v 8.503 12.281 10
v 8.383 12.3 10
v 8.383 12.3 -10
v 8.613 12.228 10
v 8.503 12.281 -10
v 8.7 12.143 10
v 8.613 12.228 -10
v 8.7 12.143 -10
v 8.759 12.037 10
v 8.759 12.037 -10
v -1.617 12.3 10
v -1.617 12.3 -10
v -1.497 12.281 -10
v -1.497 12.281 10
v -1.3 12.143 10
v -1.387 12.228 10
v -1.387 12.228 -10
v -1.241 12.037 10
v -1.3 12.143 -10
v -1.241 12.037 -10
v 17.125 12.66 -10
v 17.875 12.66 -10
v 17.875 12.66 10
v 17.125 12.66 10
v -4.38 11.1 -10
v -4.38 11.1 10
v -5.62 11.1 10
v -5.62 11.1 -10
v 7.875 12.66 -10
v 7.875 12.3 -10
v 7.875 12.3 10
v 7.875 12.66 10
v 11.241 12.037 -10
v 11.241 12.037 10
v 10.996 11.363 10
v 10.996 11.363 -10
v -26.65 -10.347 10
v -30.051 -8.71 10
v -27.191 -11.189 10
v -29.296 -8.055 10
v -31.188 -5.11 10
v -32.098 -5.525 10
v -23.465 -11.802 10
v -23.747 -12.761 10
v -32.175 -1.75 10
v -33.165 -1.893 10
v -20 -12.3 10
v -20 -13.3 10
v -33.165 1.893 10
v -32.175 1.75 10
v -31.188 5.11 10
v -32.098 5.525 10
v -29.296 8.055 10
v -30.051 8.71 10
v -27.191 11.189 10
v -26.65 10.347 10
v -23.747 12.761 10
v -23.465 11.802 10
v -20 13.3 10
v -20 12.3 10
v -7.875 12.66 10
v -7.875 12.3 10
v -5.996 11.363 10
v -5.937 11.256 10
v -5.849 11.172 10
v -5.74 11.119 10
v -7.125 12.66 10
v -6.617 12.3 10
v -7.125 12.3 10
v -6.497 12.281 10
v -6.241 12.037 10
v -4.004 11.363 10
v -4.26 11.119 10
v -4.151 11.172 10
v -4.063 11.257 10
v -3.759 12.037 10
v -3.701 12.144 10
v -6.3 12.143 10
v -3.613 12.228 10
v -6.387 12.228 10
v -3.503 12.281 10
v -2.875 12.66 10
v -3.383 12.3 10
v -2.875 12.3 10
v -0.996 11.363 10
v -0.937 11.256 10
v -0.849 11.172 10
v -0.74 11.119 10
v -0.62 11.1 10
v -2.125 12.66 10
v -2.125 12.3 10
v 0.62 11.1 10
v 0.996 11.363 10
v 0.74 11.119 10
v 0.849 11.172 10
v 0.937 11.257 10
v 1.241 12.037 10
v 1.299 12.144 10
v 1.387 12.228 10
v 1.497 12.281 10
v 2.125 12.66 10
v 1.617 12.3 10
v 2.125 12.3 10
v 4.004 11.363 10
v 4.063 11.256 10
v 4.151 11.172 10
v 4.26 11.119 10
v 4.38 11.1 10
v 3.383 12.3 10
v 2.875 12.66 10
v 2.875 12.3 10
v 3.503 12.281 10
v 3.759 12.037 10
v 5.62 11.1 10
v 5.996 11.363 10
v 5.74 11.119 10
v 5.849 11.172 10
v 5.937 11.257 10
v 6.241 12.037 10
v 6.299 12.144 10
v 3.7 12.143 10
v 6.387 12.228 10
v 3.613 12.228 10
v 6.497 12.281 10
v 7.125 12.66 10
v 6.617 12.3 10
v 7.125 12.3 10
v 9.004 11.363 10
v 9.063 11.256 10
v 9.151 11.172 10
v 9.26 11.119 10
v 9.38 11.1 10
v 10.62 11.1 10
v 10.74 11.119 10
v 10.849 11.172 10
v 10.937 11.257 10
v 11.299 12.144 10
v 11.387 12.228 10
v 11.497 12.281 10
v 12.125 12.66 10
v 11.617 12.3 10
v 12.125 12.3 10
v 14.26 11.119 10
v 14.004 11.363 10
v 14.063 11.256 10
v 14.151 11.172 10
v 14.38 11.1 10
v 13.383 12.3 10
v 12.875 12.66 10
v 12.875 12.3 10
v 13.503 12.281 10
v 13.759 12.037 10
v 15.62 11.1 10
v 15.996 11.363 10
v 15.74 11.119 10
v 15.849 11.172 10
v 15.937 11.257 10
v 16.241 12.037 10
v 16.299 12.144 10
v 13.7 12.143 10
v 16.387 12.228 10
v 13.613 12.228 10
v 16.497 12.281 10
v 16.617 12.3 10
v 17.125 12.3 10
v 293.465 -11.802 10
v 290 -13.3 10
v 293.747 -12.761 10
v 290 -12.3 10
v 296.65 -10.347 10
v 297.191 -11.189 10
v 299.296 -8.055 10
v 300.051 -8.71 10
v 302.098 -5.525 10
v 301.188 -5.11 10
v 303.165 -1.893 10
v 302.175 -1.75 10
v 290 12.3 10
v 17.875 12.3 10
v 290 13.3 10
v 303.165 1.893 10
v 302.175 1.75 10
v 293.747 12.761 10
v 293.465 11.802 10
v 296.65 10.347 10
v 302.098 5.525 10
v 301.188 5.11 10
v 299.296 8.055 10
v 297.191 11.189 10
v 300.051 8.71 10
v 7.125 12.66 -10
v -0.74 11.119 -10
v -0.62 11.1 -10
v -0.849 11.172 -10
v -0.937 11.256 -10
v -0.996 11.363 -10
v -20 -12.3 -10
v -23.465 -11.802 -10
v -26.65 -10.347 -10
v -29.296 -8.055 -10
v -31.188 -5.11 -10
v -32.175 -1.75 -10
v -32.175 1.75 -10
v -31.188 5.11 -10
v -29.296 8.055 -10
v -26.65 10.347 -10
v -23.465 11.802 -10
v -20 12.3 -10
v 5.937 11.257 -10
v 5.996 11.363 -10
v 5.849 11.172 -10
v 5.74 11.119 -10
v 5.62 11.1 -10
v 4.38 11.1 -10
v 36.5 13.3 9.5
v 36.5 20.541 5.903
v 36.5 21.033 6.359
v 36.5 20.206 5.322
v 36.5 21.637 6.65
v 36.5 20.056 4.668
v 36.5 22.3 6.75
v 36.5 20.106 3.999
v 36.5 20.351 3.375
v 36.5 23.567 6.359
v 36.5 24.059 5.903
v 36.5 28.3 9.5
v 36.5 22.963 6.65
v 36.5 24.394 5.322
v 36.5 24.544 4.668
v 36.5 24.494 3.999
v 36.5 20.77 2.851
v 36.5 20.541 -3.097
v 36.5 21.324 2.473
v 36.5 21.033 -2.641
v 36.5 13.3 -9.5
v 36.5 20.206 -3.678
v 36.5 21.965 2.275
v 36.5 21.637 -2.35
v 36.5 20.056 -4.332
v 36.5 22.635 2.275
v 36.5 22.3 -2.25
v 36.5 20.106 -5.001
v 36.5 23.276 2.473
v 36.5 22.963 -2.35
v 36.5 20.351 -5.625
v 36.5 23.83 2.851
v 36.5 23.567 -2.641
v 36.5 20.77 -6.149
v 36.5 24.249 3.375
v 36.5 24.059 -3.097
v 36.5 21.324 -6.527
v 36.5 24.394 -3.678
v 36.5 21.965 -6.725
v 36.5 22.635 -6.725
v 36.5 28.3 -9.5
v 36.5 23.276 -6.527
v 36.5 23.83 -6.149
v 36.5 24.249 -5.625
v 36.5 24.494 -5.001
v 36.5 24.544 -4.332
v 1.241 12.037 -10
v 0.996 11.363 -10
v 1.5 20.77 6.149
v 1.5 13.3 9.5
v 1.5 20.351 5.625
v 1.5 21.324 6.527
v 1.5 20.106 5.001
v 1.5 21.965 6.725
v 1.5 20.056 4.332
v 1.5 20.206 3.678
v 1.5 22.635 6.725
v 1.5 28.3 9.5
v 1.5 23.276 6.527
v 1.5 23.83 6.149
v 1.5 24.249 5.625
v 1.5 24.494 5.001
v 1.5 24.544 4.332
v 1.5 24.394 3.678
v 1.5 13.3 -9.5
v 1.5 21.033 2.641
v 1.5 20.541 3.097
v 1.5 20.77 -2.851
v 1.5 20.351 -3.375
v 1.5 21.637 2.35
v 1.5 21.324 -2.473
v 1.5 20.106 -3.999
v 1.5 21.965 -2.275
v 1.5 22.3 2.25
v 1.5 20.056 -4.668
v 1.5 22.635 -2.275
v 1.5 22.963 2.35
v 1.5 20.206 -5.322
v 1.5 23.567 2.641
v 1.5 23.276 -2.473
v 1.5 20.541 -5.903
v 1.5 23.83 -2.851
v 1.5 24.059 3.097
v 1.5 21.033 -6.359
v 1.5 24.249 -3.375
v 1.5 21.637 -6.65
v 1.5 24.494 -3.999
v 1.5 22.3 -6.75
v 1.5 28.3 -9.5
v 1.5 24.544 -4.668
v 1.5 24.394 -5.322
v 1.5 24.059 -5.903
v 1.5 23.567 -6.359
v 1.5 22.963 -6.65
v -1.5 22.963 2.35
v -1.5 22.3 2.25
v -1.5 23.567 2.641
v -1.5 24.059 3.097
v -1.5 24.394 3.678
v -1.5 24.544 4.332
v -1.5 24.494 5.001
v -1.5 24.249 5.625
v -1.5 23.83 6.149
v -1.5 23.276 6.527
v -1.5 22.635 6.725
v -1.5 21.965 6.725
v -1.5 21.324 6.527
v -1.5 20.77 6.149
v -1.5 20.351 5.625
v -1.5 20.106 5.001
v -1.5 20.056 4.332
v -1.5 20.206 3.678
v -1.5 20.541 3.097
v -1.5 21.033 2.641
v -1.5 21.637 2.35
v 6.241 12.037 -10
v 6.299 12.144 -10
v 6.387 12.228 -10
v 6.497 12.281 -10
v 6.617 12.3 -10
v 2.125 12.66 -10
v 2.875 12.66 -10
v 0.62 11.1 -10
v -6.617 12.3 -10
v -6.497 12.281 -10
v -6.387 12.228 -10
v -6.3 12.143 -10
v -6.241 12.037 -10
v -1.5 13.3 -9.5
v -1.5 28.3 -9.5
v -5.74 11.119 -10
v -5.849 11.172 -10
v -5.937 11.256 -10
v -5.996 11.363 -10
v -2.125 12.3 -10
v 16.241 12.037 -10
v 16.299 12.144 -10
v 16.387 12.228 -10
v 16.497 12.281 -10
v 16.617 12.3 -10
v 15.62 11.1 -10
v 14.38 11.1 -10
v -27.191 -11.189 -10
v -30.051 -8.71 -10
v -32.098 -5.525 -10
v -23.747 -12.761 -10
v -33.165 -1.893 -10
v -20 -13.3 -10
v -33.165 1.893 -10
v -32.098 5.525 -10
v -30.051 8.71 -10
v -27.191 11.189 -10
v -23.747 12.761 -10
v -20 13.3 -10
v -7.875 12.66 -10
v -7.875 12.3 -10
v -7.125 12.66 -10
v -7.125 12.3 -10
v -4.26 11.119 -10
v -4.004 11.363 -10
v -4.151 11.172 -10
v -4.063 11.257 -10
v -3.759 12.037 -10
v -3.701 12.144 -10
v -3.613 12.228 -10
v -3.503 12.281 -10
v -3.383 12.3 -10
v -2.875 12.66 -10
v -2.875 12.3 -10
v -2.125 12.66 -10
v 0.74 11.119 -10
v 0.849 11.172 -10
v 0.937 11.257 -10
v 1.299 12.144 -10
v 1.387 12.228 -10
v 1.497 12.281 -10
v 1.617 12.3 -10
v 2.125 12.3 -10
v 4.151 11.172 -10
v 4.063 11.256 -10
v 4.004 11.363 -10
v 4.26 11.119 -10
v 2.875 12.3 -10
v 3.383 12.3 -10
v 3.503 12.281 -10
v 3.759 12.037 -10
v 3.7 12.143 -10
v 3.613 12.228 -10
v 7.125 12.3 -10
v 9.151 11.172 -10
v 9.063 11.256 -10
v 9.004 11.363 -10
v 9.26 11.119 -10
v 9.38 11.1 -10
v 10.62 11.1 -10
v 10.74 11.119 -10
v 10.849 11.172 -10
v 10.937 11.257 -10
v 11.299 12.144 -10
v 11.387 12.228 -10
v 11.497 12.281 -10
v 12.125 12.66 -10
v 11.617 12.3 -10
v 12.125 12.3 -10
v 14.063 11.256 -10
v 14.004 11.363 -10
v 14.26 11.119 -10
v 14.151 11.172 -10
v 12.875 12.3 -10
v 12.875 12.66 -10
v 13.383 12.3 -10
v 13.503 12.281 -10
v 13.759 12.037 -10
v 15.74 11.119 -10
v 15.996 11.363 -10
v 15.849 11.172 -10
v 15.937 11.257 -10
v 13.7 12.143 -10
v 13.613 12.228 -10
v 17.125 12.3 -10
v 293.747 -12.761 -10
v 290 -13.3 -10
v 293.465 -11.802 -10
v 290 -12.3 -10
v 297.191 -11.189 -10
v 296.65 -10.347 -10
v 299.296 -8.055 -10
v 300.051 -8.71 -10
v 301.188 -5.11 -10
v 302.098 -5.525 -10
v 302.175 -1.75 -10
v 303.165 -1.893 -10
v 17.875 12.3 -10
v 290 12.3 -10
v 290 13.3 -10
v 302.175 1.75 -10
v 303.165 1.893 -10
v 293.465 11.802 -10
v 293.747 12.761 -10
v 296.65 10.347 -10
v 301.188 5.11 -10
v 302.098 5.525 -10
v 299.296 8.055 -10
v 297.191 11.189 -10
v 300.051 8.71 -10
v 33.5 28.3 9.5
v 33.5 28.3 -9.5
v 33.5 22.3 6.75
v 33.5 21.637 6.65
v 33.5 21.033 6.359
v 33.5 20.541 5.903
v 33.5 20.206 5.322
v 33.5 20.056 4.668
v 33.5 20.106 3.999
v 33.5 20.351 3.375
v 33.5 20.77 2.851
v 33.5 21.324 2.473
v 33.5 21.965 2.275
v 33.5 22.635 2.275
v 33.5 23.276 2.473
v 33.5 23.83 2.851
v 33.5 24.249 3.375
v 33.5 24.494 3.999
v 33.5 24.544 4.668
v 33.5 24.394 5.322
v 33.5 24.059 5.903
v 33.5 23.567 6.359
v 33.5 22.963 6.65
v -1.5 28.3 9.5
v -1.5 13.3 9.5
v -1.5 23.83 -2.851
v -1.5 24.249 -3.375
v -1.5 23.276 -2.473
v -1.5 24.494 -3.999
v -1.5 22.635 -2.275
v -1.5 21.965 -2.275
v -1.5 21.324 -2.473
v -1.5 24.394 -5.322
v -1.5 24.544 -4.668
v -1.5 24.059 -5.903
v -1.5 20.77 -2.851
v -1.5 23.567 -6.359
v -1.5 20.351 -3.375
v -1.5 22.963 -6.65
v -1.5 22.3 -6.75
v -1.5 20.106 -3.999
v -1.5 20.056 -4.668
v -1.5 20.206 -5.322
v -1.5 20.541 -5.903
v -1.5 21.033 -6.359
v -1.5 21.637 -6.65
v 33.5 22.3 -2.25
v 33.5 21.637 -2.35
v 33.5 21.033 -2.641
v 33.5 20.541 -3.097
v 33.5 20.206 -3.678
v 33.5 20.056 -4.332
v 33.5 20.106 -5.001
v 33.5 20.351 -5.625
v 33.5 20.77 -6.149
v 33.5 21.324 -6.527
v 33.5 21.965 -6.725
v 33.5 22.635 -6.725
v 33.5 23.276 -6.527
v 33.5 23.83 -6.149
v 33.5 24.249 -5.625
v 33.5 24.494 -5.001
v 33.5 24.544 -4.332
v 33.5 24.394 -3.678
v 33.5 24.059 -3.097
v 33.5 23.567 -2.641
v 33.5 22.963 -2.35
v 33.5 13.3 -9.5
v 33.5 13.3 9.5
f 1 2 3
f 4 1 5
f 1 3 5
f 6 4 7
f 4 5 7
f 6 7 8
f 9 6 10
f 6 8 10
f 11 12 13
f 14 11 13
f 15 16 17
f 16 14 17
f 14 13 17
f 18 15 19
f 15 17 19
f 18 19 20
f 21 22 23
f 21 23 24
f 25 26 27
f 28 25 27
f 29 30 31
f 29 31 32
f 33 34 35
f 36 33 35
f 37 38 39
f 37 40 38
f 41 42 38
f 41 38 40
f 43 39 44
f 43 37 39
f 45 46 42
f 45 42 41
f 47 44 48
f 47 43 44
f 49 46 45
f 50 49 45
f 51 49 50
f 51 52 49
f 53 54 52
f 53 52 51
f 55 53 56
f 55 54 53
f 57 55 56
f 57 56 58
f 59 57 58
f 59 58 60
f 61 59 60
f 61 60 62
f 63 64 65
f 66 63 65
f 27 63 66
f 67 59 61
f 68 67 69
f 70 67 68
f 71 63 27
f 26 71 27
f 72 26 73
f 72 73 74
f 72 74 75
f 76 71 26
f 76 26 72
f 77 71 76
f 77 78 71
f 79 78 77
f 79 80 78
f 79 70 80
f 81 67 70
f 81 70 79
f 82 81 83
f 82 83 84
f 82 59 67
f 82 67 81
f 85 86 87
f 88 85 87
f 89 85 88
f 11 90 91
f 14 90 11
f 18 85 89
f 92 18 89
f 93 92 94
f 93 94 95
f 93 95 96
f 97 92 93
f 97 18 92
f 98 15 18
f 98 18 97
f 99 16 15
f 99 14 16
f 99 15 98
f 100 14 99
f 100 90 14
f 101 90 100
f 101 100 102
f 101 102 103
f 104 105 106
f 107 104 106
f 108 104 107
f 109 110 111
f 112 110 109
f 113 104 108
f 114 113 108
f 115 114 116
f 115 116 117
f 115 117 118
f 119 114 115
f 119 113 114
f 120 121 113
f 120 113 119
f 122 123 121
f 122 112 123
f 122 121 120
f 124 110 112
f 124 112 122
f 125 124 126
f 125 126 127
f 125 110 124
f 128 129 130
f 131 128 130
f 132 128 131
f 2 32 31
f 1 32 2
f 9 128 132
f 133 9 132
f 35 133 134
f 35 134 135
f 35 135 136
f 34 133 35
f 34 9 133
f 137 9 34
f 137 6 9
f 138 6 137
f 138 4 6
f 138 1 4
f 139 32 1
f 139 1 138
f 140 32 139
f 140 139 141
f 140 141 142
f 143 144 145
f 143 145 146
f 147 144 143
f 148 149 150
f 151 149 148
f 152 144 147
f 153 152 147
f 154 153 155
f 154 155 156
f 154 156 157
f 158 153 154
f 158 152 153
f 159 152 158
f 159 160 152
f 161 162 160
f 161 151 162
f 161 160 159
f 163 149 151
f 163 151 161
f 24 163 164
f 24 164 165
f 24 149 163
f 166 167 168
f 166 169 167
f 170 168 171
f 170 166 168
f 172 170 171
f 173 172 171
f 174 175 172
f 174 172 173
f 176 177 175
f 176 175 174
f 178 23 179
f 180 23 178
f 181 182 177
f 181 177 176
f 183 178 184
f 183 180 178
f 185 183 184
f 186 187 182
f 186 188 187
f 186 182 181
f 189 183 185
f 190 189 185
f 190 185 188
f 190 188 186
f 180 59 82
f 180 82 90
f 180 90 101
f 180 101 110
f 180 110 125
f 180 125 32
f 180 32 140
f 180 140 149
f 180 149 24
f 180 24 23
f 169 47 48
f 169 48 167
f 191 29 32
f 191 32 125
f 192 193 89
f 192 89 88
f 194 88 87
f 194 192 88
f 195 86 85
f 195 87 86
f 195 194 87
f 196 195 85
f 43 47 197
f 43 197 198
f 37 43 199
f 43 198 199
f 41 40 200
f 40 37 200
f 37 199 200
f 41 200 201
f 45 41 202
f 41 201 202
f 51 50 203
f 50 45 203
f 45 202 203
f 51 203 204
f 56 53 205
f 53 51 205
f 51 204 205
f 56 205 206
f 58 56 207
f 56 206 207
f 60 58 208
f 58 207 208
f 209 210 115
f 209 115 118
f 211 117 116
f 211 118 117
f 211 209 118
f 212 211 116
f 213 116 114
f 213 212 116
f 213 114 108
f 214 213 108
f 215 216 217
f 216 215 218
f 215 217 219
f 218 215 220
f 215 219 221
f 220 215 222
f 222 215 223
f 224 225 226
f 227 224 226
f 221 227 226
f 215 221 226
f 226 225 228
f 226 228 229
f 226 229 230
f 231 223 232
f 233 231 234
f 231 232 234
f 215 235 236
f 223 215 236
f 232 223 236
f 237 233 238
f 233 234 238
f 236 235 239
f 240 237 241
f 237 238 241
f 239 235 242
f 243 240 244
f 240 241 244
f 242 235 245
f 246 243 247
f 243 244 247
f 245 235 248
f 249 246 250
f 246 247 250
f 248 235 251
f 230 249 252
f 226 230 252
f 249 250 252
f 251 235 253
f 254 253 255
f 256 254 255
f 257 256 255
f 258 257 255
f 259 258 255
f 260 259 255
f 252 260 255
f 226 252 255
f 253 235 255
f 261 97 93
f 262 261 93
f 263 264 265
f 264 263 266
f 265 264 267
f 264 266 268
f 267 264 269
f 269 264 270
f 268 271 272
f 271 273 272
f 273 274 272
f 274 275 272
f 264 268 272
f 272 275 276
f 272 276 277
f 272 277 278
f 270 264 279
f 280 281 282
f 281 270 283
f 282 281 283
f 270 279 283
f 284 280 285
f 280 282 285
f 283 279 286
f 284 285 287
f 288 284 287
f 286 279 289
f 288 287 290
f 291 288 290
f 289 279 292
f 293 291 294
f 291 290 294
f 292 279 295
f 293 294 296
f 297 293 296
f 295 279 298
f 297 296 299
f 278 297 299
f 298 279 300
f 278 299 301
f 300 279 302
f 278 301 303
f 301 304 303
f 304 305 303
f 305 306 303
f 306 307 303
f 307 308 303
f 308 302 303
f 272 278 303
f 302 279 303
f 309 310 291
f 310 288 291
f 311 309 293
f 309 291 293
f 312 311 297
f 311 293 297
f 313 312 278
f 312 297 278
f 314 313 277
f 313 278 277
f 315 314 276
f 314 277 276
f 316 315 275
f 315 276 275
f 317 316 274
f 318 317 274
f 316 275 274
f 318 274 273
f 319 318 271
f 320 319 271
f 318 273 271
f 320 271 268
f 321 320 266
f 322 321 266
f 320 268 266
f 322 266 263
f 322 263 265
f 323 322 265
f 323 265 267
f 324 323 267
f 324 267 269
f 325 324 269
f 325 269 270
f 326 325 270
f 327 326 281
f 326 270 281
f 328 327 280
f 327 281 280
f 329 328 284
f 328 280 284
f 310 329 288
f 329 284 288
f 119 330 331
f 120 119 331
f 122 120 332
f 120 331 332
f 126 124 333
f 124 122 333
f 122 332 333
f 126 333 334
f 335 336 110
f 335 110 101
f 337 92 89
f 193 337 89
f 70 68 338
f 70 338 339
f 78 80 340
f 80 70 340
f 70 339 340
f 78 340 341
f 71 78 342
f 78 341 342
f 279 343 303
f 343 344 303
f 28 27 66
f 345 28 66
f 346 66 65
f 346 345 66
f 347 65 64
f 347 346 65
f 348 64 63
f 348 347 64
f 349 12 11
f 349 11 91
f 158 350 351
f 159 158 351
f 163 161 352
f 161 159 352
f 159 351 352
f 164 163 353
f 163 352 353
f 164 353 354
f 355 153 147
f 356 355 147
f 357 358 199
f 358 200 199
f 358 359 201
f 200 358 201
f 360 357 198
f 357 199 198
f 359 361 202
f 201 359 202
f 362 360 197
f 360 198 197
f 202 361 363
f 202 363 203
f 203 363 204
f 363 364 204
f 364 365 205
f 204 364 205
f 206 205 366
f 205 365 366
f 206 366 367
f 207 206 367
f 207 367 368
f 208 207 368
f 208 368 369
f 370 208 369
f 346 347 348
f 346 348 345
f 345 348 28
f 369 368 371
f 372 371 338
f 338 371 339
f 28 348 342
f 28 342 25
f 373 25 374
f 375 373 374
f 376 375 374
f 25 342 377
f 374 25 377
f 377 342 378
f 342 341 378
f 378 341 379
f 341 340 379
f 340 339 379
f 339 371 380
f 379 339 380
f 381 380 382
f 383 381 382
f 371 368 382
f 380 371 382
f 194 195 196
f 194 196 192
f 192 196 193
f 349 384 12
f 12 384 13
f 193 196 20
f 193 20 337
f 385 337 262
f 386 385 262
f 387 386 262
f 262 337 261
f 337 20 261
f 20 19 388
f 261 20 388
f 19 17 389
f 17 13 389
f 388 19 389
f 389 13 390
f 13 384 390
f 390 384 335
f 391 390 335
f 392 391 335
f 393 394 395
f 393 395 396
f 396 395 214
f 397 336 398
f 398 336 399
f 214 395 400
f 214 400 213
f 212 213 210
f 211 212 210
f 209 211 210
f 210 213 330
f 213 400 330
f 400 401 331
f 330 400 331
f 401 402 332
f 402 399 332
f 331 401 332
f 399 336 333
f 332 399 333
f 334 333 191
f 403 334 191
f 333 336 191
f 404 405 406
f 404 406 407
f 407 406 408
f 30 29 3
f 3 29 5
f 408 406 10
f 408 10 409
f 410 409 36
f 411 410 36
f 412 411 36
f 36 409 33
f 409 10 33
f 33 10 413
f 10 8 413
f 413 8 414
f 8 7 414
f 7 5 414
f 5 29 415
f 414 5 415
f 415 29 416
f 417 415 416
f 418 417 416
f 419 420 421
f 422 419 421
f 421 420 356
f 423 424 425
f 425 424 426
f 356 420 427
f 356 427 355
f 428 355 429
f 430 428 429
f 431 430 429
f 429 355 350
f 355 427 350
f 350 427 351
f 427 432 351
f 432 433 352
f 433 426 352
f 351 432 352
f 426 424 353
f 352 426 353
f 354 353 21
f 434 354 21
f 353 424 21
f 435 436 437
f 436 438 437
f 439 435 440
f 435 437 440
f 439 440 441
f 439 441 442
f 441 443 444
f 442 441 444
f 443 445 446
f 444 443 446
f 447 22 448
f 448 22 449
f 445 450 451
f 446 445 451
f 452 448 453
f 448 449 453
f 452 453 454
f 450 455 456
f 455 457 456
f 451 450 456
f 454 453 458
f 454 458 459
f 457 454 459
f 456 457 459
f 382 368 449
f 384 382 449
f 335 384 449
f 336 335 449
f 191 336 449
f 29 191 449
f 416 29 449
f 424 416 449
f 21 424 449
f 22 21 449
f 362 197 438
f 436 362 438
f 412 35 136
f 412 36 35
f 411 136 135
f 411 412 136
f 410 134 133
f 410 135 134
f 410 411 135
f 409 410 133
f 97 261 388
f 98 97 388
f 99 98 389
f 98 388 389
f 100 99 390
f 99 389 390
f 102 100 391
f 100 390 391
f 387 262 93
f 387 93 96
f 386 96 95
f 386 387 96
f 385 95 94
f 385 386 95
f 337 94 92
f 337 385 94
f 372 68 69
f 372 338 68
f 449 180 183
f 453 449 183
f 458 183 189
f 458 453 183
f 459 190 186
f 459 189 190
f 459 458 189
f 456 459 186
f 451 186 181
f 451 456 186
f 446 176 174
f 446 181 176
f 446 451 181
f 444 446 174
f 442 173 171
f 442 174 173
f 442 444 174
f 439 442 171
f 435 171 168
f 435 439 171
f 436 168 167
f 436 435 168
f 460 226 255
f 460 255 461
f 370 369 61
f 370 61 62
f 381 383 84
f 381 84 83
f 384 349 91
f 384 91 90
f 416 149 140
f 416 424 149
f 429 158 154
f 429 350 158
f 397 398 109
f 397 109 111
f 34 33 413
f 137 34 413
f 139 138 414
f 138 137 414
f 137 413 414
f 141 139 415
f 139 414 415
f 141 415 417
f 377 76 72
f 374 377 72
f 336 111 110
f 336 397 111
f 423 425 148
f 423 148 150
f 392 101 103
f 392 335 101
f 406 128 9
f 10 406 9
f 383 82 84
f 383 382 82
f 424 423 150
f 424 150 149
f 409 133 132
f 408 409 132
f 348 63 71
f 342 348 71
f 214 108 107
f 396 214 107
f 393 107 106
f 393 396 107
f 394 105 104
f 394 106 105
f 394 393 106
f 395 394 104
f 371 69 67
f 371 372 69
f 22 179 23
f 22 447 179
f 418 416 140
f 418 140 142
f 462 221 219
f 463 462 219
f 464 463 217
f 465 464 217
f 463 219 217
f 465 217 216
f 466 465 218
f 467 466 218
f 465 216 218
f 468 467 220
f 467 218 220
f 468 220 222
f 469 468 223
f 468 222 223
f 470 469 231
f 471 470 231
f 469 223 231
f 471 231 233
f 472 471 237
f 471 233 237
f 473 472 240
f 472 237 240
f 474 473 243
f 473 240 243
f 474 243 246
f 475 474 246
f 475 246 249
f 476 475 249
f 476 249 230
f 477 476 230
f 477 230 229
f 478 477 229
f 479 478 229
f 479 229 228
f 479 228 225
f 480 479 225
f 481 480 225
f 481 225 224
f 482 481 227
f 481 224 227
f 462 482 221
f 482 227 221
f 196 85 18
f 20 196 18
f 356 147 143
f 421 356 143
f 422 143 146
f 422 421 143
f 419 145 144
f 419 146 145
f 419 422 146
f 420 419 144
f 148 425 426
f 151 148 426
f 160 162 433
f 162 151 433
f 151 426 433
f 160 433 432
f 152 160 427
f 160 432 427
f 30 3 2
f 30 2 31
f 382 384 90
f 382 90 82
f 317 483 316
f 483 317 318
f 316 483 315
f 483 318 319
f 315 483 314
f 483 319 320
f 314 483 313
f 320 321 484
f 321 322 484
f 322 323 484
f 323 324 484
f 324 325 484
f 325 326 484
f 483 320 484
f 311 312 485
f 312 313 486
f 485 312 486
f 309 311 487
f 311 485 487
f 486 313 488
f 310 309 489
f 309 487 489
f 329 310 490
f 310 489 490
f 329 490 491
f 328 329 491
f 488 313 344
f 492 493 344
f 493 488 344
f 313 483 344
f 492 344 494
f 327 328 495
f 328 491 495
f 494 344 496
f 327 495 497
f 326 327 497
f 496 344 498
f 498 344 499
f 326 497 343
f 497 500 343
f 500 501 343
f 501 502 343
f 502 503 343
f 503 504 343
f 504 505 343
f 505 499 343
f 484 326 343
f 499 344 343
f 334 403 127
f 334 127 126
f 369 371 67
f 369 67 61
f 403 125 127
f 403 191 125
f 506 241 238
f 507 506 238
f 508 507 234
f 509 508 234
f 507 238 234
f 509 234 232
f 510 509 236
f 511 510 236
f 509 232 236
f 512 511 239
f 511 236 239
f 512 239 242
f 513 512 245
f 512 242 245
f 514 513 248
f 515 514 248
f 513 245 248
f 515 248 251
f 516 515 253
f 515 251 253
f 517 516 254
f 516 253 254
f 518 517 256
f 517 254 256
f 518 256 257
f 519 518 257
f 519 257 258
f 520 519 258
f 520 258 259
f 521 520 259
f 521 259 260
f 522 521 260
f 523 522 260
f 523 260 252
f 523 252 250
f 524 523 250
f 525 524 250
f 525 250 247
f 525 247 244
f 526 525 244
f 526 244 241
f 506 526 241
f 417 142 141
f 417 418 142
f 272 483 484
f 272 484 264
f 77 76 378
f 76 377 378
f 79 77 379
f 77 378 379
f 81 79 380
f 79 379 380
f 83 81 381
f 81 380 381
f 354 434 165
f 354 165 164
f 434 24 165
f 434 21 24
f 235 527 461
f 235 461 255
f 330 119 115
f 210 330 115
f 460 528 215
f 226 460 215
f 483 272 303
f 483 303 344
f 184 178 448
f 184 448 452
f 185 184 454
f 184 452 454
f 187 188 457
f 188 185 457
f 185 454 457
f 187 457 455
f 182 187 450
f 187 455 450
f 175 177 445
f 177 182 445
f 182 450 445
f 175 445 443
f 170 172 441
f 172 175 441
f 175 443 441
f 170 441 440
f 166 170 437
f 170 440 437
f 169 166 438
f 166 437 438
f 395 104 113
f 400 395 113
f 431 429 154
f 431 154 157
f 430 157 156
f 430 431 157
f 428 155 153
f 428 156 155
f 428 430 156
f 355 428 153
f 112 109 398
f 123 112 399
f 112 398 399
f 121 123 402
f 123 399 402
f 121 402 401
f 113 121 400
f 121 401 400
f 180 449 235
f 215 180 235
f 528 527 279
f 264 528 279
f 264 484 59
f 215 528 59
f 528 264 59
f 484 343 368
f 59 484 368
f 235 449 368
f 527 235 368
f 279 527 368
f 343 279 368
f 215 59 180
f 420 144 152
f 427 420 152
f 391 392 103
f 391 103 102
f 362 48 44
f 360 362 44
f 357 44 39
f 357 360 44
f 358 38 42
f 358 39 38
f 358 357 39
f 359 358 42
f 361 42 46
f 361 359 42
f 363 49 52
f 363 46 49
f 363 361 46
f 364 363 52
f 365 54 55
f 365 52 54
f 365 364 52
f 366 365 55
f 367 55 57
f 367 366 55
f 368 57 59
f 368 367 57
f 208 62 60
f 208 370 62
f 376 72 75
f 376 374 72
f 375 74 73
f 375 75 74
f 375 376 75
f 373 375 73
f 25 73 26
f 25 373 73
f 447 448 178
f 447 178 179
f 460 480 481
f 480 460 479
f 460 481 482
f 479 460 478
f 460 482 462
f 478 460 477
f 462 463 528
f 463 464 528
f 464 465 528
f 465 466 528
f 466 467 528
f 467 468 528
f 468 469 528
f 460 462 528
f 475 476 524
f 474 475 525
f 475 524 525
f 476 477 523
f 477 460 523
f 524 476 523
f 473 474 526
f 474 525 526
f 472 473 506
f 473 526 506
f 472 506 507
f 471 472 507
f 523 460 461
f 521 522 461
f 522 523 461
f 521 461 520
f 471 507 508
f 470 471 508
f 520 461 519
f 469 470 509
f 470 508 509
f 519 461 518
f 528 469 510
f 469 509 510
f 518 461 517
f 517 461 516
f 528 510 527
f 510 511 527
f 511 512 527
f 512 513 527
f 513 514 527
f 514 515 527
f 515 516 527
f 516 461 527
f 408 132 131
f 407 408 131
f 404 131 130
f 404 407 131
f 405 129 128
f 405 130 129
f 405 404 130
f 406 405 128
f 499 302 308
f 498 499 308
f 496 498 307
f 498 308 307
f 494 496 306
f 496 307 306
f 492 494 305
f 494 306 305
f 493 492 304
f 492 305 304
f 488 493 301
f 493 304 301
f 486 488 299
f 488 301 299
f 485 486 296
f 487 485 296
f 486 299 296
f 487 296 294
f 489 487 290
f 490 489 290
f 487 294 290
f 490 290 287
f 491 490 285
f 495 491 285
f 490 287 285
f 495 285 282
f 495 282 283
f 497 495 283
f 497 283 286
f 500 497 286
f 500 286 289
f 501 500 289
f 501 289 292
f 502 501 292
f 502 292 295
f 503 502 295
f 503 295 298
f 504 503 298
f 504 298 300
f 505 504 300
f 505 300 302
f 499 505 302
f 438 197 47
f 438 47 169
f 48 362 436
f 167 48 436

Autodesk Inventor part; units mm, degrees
ref_plane "XZ Plane" through (0, 0, 0) normal (0, 1, 0) x (-1, 0, 0)
ref_plane "XY Plane" through (0, 0, 0) normal (0, 0, 1) x (1, 0, 0)
sketch "Sketch_2" plane through (0, 0, 0) normal (0, 0, 1) x (1, 0, 0)
  arc A0 (-20, 13.3) -> (-20, -13.3) centre (-20, 0) ccw
  line L0 (-20, -13.3) -> (290, -13.3)
  arc A1 (290, -13.3) -> (290, 13.3) centre (290, 0) ccw
  line L1 (290, 13.3) -> (-20, 13.3)
extrude "Extrusion1" add sketch "Sketch_2" along normal mid plane 20
sketch "Sketch_8" plane through (0, 0, 0) normal (0, 0, 1) x (1, 0, 0)
  line L0 (-1.5, 28.3) -> (-1.5, 13.3)
  line L1 (-1.5, 13.3) -> (1.5, 13.3)
  line L2 (1.5, 13.3) -> (1.5, 28.3)
  line L3 (1.5, 28.3) -> (-1.5, 28.3)
extrude "Extrusion2" add sketch "Sketch_8" along normal mid plane 19
sketch "_____4" plane through (0, 0, 0) normal (1, 0, 0) x (0, 0, -1)
  circle A0 centre (-4.5, 22.3) radius 2.25
extrude "Extrusion3" cut sketch "_____4" along normal mid plane 6
sketch "_____5" plane through (0, 0, 0) normal (1, 0, 0) x (0, 0, -1)
  circle A0 centre (4.5, 22.3) radius 2.25
extrude "Extrusion4" cut sketch "_____5" along normal mid plane 6
sketch "_____2" plane through (0, 0, 0) normal (0, 0, 1) x (1, 0, 0)
  line L0 (33.5, 8.3) -> (36.5, 8.3)
  line L1 (36.5, 8.3) -> (36.5, 28.3)
  line L2 (36.5, 28.3) -> (33.5, 28.3)
  line L3 (33.5, 28.3) -> (33.5, 8.3)
extrude "Extrusion5" add sketch "_____2" along normal mid plane 19
sketch "Sketch6" plane through (33.5, 13.3, 9.5) normal (-1, 0, 0) x (0, 0, 1)
  point P0 (-14, 9)
hole "Hole1" at (33.5, 22.3, -4.5) direction (1, 0, 0) diameter 4.5 depth 3
sketch "Sketch7" plane through (33.5, 13.3, 9.5) normal (-1, 0, 0) x (0, 0, 1)
  point P0 (-5, 9)
hole "Hole2" at (33.5, 22.3, 4.5) direction (1, 0, 0) diameter 4.5 depth 3
sketch "Sketch_4" plane through (0, 0, 0) normal (0, 0, 1) x (1, 0, 0)
  arc A0 (-20, 12.3) -> (-20, -12.3) centre (-20, 0) ccw
  line L0 (-20, -12.3) -> (290, -12.3)
  arc A1 (290, -12.3) -> (290, 12.3) centre (290, 0) ccw
  line L1 (290, 12.3) -> (17.5, 12.3)
  line L2 (17.5, 12.3) -> (17.5, 11.1)
  line L3 (17.5, 11.1) -> (-7.5, 11.1)
  line L4 (-7.5, 11.1) -> (-7.5, 12.3)
  line L5 (-7.5, 12.3) -> (-20, 12.3)
extrude "Extrusion6" cut sketch "Sketch_4" along normal mid plane 20
sketch "Sketch_64" plane through (0, 0, 0) normal (0, 0, 1) x (1, 0, 0)
  line L0 (-9.3801, 11.1) -> (-9.3801, 10.1)
  line L1 (-9.3801, 10.1) -> (-5.6199, 10.1)
  line L2 (-5.6199, 10.1) -> (-5.6199, 11.1)
  arc A0 (-5.9958, 11.3632) -> (-5.6199, 11.1) centre (-5.6199, 11.5) ccw
  line L3 (-5.9958, 11.3632) -> (-6.241, 12.0368)
  arc A1 (-6.241, 12.0368) -> (-6.6168, 12.3) centre (-6.6168, 11.9) ccw
  line L4 (-6.6168, 12.3) -> (-7.125, 12.3)
  line L5 (-7.125, 12.3) -> (-7.125, 12.66)
  line L6 (-7.125, 12.66) -> (-7.875, 12.66)
  line L7 (-7.875, 12.66) -> (-7.875, 12.3)
  line L8 (-7.875, 12.3) -> (-8.3832, 12.3)
  arc A2 (-8.3832, 12.3) -> (-8.759, 12.0368) centre (-8.3832, 11.9) ccw
  line L9 (-8.759, 12.0368) -> (-9.0042, 11.3632)
  arc A3 (-9.3801, 11.1) -> (-9.0042, 11.3632) centre (-9.3801, 11.5) ccw
extrude "Extrusion7" cut sketch "Sketch_64" along normal mid plane 20
pattern_linear "Rectangular Pattern1" count 6 spacing 5 along (1, 0, 0) of "Extrusion7"
ref_plane "作業平面3" through (135, 0, 0) normal (1, 0, 0) x (0, 1, 0)
ref_plane "作業平面1" through (303.3, 0, 0) normal (1, 0, 0) x (0, 1, 0)
ref_plane "作業平面2" through (-33.3, 0, 0) normal (1, 0, 0) x (0, 1, 0)
properties part number "ATBT-700T5200-B-P35_info-1-16-16"
